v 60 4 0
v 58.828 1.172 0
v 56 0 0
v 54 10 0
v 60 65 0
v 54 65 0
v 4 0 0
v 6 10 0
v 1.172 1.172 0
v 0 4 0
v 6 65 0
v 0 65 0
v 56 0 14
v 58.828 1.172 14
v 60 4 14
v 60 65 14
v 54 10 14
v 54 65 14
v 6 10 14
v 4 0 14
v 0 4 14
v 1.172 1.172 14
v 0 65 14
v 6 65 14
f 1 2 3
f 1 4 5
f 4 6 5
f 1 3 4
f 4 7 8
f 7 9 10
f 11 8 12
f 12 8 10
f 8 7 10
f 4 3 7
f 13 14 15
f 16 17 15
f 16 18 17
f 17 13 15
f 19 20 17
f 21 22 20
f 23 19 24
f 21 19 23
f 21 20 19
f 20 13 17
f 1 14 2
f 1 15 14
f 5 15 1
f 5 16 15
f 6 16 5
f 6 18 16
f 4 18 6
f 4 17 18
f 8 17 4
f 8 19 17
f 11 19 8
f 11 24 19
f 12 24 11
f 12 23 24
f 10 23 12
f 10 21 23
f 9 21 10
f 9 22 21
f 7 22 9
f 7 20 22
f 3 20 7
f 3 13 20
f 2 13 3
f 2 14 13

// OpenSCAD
$fn = 32;

// ----------------------------------------------------------------------
// Heat sink frame: 60 x 65 mm frame, 6 mm walls
// ----------------------------------------------------------------------

// --- parameters (mm) ---
profile_height = 14;      // extrusion height
profile_points = 12;      // points of the closed outline

profile = [[0, 4], [1.172, 1.172], [4, 0], [56, 0], [58.828, 1.172], [60, 4], [60, 65], [54, 65], [54, 10], [6, 10], [6, 65], [0, 65]];  // single closed polygon, 12 points, counter clockwise

// --- the one profile operation ---
linear_extrude(height = profile_height) polygon(points = profile);
